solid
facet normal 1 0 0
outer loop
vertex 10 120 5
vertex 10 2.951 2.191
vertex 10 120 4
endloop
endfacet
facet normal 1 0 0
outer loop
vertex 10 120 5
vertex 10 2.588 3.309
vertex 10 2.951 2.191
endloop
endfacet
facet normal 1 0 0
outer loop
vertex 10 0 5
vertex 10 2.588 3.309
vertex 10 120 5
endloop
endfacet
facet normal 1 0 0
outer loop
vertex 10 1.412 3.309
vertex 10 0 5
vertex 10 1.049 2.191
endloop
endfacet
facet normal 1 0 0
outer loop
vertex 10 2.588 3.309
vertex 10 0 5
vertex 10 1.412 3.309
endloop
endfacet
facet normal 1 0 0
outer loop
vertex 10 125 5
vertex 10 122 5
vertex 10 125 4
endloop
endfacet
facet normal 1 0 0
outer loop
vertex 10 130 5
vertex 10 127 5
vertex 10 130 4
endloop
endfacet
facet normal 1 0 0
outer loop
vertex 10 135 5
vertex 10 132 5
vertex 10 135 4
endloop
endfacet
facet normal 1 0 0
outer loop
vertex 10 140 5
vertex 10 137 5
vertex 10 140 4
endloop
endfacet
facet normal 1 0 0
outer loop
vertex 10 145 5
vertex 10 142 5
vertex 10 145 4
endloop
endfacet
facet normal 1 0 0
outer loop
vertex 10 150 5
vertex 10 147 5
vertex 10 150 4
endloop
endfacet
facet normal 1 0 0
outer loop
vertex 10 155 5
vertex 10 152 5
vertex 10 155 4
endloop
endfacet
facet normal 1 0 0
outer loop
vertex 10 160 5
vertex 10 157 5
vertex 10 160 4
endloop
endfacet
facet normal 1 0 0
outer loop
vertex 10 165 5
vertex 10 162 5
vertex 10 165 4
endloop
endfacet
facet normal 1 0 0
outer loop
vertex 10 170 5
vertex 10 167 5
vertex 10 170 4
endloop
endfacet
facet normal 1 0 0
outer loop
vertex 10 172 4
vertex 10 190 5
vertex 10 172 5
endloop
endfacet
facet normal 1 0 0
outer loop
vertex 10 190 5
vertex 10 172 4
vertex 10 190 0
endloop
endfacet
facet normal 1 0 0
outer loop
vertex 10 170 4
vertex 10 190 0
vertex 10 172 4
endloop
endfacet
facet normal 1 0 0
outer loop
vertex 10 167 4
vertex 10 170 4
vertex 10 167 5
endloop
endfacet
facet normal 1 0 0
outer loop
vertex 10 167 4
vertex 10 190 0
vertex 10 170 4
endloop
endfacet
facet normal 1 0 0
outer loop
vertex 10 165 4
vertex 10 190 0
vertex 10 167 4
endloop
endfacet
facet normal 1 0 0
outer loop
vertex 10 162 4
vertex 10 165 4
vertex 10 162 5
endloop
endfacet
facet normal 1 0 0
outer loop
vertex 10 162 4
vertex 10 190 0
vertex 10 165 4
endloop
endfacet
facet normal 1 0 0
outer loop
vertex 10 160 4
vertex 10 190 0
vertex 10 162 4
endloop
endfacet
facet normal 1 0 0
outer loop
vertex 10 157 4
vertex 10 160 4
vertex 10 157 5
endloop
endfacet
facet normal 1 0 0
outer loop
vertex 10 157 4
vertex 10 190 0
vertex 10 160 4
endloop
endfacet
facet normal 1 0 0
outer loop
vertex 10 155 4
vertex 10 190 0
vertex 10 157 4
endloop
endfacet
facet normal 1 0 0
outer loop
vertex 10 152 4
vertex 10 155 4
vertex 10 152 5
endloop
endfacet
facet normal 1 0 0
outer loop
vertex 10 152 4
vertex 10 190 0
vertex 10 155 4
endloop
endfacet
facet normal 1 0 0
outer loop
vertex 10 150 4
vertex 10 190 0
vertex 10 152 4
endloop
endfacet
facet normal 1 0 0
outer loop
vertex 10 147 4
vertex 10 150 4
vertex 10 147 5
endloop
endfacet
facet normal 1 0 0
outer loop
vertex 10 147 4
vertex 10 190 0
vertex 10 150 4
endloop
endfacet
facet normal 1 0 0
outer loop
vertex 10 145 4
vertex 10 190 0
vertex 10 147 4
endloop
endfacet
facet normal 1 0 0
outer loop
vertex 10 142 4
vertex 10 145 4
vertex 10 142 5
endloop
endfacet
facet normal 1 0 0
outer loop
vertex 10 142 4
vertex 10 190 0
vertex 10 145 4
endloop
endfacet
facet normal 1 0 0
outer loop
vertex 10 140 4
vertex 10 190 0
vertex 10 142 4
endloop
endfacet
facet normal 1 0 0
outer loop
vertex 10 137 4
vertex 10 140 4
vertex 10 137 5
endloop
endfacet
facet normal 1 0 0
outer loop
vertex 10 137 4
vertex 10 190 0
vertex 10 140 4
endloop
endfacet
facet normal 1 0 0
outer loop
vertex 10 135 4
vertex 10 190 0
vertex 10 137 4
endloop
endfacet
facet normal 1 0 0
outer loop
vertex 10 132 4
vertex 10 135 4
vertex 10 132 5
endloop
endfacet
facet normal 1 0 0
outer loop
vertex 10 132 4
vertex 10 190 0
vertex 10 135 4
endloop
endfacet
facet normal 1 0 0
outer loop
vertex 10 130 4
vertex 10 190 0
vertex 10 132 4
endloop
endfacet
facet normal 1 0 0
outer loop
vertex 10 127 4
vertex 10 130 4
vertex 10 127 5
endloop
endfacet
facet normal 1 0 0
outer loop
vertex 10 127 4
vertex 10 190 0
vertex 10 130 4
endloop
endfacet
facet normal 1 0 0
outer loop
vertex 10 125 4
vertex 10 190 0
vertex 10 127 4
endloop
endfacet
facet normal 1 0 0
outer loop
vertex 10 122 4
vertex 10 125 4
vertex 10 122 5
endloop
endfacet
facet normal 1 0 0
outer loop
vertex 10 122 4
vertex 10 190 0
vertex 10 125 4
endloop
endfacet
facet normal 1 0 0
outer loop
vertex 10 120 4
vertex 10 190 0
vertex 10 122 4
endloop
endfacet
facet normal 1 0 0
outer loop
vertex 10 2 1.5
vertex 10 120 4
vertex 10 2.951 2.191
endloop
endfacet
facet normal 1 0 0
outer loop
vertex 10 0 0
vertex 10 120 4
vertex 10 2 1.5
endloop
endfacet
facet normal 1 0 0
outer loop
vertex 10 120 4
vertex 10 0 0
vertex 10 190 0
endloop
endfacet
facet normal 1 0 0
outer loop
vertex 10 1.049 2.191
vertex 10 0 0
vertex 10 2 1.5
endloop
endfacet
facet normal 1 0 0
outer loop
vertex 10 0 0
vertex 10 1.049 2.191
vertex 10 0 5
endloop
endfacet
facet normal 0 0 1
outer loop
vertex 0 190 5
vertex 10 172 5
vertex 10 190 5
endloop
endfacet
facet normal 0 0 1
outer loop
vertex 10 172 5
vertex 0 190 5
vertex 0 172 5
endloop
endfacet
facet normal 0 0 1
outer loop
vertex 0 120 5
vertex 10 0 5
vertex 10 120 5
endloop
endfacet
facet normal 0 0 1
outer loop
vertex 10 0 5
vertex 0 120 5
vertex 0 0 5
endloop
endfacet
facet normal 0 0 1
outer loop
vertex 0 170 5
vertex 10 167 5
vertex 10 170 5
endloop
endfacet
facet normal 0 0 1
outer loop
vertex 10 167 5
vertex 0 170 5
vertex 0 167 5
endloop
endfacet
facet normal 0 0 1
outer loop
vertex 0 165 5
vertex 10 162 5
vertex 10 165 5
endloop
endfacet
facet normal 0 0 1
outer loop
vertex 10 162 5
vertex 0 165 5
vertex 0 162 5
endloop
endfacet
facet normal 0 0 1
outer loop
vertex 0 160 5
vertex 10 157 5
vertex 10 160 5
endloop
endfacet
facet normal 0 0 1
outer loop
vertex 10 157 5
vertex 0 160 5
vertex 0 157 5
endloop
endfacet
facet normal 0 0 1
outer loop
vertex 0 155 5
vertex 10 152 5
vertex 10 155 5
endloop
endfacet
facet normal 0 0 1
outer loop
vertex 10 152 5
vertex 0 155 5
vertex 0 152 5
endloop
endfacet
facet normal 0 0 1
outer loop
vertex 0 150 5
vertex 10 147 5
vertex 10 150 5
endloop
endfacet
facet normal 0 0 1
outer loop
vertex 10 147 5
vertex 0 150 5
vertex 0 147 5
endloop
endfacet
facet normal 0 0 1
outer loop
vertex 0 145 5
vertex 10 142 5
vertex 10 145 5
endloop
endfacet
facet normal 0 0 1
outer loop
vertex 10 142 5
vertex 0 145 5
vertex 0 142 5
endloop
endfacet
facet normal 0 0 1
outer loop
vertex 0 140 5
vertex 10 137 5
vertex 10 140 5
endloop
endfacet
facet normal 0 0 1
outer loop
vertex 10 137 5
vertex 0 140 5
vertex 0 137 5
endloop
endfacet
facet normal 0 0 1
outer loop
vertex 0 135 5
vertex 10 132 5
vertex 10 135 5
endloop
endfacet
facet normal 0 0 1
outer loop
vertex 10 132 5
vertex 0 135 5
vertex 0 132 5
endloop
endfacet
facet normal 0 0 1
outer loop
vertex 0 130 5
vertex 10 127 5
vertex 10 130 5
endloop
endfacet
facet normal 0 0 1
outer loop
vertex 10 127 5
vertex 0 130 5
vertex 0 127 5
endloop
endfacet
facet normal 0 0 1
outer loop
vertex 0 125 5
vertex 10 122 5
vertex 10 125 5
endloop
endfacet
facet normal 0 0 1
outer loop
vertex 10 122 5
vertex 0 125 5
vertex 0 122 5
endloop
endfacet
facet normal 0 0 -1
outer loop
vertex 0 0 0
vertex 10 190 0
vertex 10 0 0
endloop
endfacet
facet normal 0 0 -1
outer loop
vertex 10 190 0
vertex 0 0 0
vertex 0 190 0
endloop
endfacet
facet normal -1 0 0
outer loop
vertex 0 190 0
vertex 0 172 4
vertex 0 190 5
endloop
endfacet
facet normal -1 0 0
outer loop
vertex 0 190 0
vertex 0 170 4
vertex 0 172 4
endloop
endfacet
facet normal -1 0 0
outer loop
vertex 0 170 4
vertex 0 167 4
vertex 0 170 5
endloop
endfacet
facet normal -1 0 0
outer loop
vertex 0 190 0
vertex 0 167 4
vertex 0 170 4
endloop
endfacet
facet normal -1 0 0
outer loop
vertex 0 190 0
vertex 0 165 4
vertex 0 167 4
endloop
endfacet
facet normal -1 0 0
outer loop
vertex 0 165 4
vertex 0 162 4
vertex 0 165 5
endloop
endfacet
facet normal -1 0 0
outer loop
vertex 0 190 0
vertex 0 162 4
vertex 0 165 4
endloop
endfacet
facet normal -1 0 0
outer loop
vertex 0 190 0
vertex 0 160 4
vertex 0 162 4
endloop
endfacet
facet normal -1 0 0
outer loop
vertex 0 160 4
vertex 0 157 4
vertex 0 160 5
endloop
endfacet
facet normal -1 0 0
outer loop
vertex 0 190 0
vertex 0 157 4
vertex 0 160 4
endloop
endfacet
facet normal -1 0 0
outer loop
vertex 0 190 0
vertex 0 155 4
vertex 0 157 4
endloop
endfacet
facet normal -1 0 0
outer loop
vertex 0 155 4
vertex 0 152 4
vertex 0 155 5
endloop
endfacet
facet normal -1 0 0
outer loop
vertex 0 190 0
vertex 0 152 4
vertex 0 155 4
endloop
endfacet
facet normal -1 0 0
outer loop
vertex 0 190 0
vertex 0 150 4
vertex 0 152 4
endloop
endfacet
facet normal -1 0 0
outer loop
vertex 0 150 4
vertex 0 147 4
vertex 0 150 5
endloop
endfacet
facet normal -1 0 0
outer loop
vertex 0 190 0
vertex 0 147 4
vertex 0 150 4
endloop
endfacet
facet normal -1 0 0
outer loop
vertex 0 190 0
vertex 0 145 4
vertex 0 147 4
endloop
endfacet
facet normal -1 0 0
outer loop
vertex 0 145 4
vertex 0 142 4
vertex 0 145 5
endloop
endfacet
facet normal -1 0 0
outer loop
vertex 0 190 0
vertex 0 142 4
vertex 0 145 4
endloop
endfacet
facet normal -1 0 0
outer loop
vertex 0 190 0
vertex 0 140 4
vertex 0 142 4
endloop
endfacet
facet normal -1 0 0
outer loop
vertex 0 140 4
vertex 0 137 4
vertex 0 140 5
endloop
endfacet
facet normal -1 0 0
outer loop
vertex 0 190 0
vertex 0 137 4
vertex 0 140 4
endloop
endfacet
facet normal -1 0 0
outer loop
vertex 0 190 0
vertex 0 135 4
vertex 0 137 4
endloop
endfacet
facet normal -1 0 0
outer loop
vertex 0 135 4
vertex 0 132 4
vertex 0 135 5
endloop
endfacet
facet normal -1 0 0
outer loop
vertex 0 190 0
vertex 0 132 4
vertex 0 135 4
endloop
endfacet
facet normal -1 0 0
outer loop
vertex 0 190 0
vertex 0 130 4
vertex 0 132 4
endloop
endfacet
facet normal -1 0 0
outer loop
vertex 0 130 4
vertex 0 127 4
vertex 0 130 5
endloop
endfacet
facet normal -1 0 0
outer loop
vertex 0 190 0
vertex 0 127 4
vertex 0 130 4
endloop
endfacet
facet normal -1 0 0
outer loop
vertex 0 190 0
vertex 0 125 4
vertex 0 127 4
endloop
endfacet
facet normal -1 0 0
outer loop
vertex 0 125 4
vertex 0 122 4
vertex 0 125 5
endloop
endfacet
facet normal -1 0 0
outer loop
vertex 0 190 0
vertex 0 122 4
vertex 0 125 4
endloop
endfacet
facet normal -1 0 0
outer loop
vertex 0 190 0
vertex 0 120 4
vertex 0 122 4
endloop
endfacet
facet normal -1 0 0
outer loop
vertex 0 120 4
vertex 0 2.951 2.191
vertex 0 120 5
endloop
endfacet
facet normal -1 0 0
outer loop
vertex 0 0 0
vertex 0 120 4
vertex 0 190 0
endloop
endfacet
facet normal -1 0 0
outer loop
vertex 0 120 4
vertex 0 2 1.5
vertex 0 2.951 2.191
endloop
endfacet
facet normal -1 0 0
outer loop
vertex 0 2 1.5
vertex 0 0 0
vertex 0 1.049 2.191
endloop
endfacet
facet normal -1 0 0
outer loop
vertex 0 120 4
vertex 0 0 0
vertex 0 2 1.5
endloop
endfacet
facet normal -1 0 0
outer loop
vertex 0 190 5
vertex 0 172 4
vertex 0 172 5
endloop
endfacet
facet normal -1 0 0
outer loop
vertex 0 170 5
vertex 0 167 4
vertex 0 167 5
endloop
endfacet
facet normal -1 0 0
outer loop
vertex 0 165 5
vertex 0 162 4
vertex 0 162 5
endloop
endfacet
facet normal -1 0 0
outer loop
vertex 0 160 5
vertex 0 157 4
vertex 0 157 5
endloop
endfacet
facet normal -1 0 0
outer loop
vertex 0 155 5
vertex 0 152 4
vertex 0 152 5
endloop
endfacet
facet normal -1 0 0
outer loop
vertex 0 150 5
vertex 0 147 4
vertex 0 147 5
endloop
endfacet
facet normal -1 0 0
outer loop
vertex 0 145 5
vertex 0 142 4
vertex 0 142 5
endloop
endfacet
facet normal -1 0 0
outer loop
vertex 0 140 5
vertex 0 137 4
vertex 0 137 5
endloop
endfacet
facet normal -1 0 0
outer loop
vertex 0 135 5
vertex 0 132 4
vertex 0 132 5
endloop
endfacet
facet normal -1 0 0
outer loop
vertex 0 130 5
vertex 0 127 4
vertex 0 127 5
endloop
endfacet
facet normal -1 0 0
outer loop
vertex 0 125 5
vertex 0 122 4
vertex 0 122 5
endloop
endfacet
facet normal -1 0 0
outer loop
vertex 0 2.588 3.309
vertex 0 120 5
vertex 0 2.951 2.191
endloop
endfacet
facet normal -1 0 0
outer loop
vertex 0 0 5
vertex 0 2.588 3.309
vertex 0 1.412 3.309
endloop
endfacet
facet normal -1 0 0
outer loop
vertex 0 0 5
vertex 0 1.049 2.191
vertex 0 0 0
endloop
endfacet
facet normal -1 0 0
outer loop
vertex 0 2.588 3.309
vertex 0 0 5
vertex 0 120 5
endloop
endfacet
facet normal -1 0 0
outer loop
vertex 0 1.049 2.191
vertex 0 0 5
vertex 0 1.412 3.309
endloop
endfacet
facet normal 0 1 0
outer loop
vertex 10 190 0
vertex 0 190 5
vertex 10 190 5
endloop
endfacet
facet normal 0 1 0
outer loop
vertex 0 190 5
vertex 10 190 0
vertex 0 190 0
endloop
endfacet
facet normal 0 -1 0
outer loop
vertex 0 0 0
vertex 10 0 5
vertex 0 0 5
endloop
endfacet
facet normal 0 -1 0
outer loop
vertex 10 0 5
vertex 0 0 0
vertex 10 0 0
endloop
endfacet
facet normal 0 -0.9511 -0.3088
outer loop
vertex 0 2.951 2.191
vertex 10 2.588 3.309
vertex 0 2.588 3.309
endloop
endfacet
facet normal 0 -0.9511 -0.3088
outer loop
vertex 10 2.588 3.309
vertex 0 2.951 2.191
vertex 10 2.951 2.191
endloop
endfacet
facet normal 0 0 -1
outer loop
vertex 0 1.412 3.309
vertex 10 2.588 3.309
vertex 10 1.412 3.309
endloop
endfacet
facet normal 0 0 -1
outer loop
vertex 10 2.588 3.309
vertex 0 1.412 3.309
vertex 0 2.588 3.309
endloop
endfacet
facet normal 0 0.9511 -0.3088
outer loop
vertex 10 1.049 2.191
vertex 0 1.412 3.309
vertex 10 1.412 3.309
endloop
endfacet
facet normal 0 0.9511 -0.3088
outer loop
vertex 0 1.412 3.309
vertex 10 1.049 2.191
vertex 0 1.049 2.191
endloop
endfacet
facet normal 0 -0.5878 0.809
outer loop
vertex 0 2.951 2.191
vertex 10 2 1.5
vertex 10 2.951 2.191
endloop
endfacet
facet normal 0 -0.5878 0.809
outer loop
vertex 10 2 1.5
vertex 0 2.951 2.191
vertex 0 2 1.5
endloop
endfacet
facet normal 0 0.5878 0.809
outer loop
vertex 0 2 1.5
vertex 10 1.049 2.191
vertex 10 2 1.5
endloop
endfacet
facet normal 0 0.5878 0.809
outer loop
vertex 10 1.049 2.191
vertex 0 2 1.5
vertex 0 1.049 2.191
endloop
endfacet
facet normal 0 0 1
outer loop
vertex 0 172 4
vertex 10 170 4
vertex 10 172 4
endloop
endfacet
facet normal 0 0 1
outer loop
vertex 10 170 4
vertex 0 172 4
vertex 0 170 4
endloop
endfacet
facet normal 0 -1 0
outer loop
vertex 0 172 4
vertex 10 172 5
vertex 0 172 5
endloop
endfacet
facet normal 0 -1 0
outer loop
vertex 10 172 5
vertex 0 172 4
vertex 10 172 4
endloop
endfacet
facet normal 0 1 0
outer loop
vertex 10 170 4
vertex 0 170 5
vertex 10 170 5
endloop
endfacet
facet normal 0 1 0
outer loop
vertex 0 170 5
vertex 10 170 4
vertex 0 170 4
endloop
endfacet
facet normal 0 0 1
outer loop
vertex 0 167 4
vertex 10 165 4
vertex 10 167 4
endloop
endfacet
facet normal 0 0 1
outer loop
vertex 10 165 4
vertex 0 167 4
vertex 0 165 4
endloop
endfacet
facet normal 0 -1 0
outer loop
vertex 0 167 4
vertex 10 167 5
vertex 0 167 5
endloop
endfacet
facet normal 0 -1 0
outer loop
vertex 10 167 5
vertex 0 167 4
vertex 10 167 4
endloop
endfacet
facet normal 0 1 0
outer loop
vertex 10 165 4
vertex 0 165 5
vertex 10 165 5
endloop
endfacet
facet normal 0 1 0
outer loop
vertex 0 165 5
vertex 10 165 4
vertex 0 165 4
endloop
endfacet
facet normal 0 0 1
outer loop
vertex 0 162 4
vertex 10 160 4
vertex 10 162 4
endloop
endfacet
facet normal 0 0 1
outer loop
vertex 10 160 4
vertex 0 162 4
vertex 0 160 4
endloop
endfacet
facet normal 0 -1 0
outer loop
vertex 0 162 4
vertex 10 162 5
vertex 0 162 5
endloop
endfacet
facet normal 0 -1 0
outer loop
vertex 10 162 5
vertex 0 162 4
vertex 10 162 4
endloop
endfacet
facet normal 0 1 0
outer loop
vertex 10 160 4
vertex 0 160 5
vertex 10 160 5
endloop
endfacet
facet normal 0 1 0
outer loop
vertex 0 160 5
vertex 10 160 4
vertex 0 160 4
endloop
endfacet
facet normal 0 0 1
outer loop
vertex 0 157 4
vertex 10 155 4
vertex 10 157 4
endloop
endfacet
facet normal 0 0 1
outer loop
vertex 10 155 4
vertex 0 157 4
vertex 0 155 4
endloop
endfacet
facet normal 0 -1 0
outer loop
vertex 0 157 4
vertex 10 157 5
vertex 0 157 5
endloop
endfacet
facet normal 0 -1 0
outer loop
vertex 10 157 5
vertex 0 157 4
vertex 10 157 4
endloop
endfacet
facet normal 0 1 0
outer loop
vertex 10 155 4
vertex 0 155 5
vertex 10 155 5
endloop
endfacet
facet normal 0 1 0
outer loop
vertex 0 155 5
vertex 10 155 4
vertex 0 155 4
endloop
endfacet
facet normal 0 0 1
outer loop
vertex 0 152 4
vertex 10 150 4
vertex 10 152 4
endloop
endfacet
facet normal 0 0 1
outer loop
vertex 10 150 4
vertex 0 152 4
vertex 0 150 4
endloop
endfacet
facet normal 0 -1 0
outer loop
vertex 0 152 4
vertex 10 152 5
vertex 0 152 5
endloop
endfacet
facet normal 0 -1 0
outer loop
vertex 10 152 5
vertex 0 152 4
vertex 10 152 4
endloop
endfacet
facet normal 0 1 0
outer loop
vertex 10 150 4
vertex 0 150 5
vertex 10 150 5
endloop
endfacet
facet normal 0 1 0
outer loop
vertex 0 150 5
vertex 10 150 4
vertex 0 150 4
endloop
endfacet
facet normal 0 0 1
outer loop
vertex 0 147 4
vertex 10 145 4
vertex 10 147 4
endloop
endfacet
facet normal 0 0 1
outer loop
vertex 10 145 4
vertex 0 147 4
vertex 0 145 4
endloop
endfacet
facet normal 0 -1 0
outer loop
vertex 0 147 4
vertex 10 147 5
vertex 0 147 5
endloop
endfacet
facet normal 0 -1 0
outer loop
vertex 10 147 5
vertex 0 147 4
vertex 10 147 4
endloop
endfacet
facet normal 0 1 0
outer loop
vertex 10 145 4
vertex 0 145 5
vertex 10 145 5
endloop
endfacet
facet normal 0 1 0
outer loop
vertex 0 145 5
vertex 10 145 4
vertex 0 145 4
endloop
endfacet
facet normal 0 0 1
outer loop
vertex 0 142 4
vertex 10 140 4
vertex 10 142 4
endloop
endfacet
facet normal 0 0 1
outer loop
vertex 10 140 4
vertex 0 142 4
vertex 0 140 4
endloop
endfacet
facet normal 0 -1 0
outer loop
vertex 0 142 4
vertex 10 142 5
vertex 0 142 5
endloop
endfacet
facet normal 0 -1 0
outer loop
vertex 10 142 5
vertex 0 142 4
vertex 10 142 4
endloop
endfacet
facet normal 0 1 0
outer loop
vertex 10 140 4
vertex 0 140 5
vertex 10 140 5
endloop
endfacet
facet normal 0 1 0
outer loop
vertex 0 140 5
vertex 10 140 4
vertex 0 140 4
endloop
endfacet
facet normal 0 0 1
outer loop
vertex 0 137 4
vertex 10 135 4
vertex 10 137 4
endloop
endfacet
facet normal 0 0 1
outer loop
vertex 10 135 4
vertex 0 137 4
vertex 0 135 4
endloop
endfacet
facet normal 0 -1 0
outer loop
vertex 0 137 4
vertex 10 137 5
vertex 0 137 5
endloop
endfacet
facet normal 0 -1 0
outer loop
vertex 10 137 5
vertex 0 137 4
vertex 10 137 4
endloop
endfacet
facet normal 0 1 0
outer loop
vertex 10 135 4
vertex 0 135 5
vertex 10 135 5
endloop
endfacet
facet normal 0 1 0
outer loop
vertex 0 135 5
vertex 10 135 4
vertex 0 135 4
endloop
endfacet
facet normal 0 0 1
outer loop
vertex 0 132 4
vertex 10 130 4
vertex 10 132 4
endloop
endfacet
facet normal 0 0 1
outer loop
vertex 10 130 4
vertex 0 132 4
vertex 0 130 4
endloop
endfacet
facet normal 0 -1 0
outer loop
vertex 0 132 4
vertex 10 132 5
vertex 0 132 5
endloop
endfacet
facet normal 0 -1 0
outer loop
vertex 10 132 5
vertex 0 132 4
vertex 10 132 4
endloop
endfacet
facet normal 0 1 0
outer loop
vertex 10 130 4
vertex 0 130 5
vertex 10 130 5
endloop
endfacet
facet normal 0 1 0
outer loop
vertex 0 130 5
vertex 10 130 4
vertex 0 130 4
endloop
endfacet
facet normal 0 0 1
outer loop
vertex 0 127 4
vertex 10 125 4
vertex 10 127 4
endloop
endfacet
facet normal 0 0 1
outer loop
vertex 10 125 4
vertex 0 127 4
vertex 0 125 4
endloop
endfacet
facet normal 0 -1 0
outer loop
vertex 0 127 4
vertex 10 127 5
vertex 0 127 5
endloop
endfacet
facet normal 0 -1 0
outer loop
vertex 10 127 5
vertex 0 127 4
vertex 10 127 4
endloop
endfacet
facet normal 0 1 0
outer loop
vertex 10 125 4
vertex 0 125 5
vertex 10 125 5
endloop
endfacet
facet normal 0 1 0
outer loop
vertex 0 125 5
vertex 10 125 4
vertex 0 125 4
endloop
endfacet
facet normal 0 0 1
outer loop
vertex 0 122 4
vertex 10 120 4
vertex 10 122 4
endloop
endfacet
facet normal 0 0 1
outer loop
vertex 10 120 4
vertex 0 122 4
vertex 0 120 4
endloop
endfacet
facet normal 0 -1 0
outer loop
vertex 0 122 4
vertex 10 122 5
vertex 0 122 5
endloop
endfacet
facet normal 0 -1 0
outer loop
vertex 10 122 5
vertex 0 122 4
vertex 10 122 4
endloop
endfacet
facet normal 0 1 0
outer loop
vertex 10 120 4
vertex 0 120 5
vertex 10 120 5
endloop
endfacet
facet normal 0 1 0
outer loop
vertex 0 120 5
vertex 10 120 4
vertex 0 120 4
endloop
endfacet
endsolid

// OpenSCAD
difference()
{
    cube([10,190,5]);
    translate([-5,2,2.5]) rotate([0,90,0]) cylinder(d=2,h=20);
    translate([-2,170,4]) cube([15,2,5]);
    translate([-2,165,4]) cube([15,2,5]);
    translate([-2,160,4]) cube([15,2,5]);
    translate([-2,155,4]) cube([15,2,5]);
    translate([-2,150,4]) cube([15,2,5]);
    translate([-2,145,4]) cube([15,2,5]);
    translate([-2,140,4]) cube([15,2,5]);
    translate([-2,135,4]) cube([15,2,5]);
    translate([-2,130,4]) cube([15,2,5]);
    translate([-2,125,4]) cube([15,2,5]);
    translate([-2,120,4]) cube([15,2,5]);
}
